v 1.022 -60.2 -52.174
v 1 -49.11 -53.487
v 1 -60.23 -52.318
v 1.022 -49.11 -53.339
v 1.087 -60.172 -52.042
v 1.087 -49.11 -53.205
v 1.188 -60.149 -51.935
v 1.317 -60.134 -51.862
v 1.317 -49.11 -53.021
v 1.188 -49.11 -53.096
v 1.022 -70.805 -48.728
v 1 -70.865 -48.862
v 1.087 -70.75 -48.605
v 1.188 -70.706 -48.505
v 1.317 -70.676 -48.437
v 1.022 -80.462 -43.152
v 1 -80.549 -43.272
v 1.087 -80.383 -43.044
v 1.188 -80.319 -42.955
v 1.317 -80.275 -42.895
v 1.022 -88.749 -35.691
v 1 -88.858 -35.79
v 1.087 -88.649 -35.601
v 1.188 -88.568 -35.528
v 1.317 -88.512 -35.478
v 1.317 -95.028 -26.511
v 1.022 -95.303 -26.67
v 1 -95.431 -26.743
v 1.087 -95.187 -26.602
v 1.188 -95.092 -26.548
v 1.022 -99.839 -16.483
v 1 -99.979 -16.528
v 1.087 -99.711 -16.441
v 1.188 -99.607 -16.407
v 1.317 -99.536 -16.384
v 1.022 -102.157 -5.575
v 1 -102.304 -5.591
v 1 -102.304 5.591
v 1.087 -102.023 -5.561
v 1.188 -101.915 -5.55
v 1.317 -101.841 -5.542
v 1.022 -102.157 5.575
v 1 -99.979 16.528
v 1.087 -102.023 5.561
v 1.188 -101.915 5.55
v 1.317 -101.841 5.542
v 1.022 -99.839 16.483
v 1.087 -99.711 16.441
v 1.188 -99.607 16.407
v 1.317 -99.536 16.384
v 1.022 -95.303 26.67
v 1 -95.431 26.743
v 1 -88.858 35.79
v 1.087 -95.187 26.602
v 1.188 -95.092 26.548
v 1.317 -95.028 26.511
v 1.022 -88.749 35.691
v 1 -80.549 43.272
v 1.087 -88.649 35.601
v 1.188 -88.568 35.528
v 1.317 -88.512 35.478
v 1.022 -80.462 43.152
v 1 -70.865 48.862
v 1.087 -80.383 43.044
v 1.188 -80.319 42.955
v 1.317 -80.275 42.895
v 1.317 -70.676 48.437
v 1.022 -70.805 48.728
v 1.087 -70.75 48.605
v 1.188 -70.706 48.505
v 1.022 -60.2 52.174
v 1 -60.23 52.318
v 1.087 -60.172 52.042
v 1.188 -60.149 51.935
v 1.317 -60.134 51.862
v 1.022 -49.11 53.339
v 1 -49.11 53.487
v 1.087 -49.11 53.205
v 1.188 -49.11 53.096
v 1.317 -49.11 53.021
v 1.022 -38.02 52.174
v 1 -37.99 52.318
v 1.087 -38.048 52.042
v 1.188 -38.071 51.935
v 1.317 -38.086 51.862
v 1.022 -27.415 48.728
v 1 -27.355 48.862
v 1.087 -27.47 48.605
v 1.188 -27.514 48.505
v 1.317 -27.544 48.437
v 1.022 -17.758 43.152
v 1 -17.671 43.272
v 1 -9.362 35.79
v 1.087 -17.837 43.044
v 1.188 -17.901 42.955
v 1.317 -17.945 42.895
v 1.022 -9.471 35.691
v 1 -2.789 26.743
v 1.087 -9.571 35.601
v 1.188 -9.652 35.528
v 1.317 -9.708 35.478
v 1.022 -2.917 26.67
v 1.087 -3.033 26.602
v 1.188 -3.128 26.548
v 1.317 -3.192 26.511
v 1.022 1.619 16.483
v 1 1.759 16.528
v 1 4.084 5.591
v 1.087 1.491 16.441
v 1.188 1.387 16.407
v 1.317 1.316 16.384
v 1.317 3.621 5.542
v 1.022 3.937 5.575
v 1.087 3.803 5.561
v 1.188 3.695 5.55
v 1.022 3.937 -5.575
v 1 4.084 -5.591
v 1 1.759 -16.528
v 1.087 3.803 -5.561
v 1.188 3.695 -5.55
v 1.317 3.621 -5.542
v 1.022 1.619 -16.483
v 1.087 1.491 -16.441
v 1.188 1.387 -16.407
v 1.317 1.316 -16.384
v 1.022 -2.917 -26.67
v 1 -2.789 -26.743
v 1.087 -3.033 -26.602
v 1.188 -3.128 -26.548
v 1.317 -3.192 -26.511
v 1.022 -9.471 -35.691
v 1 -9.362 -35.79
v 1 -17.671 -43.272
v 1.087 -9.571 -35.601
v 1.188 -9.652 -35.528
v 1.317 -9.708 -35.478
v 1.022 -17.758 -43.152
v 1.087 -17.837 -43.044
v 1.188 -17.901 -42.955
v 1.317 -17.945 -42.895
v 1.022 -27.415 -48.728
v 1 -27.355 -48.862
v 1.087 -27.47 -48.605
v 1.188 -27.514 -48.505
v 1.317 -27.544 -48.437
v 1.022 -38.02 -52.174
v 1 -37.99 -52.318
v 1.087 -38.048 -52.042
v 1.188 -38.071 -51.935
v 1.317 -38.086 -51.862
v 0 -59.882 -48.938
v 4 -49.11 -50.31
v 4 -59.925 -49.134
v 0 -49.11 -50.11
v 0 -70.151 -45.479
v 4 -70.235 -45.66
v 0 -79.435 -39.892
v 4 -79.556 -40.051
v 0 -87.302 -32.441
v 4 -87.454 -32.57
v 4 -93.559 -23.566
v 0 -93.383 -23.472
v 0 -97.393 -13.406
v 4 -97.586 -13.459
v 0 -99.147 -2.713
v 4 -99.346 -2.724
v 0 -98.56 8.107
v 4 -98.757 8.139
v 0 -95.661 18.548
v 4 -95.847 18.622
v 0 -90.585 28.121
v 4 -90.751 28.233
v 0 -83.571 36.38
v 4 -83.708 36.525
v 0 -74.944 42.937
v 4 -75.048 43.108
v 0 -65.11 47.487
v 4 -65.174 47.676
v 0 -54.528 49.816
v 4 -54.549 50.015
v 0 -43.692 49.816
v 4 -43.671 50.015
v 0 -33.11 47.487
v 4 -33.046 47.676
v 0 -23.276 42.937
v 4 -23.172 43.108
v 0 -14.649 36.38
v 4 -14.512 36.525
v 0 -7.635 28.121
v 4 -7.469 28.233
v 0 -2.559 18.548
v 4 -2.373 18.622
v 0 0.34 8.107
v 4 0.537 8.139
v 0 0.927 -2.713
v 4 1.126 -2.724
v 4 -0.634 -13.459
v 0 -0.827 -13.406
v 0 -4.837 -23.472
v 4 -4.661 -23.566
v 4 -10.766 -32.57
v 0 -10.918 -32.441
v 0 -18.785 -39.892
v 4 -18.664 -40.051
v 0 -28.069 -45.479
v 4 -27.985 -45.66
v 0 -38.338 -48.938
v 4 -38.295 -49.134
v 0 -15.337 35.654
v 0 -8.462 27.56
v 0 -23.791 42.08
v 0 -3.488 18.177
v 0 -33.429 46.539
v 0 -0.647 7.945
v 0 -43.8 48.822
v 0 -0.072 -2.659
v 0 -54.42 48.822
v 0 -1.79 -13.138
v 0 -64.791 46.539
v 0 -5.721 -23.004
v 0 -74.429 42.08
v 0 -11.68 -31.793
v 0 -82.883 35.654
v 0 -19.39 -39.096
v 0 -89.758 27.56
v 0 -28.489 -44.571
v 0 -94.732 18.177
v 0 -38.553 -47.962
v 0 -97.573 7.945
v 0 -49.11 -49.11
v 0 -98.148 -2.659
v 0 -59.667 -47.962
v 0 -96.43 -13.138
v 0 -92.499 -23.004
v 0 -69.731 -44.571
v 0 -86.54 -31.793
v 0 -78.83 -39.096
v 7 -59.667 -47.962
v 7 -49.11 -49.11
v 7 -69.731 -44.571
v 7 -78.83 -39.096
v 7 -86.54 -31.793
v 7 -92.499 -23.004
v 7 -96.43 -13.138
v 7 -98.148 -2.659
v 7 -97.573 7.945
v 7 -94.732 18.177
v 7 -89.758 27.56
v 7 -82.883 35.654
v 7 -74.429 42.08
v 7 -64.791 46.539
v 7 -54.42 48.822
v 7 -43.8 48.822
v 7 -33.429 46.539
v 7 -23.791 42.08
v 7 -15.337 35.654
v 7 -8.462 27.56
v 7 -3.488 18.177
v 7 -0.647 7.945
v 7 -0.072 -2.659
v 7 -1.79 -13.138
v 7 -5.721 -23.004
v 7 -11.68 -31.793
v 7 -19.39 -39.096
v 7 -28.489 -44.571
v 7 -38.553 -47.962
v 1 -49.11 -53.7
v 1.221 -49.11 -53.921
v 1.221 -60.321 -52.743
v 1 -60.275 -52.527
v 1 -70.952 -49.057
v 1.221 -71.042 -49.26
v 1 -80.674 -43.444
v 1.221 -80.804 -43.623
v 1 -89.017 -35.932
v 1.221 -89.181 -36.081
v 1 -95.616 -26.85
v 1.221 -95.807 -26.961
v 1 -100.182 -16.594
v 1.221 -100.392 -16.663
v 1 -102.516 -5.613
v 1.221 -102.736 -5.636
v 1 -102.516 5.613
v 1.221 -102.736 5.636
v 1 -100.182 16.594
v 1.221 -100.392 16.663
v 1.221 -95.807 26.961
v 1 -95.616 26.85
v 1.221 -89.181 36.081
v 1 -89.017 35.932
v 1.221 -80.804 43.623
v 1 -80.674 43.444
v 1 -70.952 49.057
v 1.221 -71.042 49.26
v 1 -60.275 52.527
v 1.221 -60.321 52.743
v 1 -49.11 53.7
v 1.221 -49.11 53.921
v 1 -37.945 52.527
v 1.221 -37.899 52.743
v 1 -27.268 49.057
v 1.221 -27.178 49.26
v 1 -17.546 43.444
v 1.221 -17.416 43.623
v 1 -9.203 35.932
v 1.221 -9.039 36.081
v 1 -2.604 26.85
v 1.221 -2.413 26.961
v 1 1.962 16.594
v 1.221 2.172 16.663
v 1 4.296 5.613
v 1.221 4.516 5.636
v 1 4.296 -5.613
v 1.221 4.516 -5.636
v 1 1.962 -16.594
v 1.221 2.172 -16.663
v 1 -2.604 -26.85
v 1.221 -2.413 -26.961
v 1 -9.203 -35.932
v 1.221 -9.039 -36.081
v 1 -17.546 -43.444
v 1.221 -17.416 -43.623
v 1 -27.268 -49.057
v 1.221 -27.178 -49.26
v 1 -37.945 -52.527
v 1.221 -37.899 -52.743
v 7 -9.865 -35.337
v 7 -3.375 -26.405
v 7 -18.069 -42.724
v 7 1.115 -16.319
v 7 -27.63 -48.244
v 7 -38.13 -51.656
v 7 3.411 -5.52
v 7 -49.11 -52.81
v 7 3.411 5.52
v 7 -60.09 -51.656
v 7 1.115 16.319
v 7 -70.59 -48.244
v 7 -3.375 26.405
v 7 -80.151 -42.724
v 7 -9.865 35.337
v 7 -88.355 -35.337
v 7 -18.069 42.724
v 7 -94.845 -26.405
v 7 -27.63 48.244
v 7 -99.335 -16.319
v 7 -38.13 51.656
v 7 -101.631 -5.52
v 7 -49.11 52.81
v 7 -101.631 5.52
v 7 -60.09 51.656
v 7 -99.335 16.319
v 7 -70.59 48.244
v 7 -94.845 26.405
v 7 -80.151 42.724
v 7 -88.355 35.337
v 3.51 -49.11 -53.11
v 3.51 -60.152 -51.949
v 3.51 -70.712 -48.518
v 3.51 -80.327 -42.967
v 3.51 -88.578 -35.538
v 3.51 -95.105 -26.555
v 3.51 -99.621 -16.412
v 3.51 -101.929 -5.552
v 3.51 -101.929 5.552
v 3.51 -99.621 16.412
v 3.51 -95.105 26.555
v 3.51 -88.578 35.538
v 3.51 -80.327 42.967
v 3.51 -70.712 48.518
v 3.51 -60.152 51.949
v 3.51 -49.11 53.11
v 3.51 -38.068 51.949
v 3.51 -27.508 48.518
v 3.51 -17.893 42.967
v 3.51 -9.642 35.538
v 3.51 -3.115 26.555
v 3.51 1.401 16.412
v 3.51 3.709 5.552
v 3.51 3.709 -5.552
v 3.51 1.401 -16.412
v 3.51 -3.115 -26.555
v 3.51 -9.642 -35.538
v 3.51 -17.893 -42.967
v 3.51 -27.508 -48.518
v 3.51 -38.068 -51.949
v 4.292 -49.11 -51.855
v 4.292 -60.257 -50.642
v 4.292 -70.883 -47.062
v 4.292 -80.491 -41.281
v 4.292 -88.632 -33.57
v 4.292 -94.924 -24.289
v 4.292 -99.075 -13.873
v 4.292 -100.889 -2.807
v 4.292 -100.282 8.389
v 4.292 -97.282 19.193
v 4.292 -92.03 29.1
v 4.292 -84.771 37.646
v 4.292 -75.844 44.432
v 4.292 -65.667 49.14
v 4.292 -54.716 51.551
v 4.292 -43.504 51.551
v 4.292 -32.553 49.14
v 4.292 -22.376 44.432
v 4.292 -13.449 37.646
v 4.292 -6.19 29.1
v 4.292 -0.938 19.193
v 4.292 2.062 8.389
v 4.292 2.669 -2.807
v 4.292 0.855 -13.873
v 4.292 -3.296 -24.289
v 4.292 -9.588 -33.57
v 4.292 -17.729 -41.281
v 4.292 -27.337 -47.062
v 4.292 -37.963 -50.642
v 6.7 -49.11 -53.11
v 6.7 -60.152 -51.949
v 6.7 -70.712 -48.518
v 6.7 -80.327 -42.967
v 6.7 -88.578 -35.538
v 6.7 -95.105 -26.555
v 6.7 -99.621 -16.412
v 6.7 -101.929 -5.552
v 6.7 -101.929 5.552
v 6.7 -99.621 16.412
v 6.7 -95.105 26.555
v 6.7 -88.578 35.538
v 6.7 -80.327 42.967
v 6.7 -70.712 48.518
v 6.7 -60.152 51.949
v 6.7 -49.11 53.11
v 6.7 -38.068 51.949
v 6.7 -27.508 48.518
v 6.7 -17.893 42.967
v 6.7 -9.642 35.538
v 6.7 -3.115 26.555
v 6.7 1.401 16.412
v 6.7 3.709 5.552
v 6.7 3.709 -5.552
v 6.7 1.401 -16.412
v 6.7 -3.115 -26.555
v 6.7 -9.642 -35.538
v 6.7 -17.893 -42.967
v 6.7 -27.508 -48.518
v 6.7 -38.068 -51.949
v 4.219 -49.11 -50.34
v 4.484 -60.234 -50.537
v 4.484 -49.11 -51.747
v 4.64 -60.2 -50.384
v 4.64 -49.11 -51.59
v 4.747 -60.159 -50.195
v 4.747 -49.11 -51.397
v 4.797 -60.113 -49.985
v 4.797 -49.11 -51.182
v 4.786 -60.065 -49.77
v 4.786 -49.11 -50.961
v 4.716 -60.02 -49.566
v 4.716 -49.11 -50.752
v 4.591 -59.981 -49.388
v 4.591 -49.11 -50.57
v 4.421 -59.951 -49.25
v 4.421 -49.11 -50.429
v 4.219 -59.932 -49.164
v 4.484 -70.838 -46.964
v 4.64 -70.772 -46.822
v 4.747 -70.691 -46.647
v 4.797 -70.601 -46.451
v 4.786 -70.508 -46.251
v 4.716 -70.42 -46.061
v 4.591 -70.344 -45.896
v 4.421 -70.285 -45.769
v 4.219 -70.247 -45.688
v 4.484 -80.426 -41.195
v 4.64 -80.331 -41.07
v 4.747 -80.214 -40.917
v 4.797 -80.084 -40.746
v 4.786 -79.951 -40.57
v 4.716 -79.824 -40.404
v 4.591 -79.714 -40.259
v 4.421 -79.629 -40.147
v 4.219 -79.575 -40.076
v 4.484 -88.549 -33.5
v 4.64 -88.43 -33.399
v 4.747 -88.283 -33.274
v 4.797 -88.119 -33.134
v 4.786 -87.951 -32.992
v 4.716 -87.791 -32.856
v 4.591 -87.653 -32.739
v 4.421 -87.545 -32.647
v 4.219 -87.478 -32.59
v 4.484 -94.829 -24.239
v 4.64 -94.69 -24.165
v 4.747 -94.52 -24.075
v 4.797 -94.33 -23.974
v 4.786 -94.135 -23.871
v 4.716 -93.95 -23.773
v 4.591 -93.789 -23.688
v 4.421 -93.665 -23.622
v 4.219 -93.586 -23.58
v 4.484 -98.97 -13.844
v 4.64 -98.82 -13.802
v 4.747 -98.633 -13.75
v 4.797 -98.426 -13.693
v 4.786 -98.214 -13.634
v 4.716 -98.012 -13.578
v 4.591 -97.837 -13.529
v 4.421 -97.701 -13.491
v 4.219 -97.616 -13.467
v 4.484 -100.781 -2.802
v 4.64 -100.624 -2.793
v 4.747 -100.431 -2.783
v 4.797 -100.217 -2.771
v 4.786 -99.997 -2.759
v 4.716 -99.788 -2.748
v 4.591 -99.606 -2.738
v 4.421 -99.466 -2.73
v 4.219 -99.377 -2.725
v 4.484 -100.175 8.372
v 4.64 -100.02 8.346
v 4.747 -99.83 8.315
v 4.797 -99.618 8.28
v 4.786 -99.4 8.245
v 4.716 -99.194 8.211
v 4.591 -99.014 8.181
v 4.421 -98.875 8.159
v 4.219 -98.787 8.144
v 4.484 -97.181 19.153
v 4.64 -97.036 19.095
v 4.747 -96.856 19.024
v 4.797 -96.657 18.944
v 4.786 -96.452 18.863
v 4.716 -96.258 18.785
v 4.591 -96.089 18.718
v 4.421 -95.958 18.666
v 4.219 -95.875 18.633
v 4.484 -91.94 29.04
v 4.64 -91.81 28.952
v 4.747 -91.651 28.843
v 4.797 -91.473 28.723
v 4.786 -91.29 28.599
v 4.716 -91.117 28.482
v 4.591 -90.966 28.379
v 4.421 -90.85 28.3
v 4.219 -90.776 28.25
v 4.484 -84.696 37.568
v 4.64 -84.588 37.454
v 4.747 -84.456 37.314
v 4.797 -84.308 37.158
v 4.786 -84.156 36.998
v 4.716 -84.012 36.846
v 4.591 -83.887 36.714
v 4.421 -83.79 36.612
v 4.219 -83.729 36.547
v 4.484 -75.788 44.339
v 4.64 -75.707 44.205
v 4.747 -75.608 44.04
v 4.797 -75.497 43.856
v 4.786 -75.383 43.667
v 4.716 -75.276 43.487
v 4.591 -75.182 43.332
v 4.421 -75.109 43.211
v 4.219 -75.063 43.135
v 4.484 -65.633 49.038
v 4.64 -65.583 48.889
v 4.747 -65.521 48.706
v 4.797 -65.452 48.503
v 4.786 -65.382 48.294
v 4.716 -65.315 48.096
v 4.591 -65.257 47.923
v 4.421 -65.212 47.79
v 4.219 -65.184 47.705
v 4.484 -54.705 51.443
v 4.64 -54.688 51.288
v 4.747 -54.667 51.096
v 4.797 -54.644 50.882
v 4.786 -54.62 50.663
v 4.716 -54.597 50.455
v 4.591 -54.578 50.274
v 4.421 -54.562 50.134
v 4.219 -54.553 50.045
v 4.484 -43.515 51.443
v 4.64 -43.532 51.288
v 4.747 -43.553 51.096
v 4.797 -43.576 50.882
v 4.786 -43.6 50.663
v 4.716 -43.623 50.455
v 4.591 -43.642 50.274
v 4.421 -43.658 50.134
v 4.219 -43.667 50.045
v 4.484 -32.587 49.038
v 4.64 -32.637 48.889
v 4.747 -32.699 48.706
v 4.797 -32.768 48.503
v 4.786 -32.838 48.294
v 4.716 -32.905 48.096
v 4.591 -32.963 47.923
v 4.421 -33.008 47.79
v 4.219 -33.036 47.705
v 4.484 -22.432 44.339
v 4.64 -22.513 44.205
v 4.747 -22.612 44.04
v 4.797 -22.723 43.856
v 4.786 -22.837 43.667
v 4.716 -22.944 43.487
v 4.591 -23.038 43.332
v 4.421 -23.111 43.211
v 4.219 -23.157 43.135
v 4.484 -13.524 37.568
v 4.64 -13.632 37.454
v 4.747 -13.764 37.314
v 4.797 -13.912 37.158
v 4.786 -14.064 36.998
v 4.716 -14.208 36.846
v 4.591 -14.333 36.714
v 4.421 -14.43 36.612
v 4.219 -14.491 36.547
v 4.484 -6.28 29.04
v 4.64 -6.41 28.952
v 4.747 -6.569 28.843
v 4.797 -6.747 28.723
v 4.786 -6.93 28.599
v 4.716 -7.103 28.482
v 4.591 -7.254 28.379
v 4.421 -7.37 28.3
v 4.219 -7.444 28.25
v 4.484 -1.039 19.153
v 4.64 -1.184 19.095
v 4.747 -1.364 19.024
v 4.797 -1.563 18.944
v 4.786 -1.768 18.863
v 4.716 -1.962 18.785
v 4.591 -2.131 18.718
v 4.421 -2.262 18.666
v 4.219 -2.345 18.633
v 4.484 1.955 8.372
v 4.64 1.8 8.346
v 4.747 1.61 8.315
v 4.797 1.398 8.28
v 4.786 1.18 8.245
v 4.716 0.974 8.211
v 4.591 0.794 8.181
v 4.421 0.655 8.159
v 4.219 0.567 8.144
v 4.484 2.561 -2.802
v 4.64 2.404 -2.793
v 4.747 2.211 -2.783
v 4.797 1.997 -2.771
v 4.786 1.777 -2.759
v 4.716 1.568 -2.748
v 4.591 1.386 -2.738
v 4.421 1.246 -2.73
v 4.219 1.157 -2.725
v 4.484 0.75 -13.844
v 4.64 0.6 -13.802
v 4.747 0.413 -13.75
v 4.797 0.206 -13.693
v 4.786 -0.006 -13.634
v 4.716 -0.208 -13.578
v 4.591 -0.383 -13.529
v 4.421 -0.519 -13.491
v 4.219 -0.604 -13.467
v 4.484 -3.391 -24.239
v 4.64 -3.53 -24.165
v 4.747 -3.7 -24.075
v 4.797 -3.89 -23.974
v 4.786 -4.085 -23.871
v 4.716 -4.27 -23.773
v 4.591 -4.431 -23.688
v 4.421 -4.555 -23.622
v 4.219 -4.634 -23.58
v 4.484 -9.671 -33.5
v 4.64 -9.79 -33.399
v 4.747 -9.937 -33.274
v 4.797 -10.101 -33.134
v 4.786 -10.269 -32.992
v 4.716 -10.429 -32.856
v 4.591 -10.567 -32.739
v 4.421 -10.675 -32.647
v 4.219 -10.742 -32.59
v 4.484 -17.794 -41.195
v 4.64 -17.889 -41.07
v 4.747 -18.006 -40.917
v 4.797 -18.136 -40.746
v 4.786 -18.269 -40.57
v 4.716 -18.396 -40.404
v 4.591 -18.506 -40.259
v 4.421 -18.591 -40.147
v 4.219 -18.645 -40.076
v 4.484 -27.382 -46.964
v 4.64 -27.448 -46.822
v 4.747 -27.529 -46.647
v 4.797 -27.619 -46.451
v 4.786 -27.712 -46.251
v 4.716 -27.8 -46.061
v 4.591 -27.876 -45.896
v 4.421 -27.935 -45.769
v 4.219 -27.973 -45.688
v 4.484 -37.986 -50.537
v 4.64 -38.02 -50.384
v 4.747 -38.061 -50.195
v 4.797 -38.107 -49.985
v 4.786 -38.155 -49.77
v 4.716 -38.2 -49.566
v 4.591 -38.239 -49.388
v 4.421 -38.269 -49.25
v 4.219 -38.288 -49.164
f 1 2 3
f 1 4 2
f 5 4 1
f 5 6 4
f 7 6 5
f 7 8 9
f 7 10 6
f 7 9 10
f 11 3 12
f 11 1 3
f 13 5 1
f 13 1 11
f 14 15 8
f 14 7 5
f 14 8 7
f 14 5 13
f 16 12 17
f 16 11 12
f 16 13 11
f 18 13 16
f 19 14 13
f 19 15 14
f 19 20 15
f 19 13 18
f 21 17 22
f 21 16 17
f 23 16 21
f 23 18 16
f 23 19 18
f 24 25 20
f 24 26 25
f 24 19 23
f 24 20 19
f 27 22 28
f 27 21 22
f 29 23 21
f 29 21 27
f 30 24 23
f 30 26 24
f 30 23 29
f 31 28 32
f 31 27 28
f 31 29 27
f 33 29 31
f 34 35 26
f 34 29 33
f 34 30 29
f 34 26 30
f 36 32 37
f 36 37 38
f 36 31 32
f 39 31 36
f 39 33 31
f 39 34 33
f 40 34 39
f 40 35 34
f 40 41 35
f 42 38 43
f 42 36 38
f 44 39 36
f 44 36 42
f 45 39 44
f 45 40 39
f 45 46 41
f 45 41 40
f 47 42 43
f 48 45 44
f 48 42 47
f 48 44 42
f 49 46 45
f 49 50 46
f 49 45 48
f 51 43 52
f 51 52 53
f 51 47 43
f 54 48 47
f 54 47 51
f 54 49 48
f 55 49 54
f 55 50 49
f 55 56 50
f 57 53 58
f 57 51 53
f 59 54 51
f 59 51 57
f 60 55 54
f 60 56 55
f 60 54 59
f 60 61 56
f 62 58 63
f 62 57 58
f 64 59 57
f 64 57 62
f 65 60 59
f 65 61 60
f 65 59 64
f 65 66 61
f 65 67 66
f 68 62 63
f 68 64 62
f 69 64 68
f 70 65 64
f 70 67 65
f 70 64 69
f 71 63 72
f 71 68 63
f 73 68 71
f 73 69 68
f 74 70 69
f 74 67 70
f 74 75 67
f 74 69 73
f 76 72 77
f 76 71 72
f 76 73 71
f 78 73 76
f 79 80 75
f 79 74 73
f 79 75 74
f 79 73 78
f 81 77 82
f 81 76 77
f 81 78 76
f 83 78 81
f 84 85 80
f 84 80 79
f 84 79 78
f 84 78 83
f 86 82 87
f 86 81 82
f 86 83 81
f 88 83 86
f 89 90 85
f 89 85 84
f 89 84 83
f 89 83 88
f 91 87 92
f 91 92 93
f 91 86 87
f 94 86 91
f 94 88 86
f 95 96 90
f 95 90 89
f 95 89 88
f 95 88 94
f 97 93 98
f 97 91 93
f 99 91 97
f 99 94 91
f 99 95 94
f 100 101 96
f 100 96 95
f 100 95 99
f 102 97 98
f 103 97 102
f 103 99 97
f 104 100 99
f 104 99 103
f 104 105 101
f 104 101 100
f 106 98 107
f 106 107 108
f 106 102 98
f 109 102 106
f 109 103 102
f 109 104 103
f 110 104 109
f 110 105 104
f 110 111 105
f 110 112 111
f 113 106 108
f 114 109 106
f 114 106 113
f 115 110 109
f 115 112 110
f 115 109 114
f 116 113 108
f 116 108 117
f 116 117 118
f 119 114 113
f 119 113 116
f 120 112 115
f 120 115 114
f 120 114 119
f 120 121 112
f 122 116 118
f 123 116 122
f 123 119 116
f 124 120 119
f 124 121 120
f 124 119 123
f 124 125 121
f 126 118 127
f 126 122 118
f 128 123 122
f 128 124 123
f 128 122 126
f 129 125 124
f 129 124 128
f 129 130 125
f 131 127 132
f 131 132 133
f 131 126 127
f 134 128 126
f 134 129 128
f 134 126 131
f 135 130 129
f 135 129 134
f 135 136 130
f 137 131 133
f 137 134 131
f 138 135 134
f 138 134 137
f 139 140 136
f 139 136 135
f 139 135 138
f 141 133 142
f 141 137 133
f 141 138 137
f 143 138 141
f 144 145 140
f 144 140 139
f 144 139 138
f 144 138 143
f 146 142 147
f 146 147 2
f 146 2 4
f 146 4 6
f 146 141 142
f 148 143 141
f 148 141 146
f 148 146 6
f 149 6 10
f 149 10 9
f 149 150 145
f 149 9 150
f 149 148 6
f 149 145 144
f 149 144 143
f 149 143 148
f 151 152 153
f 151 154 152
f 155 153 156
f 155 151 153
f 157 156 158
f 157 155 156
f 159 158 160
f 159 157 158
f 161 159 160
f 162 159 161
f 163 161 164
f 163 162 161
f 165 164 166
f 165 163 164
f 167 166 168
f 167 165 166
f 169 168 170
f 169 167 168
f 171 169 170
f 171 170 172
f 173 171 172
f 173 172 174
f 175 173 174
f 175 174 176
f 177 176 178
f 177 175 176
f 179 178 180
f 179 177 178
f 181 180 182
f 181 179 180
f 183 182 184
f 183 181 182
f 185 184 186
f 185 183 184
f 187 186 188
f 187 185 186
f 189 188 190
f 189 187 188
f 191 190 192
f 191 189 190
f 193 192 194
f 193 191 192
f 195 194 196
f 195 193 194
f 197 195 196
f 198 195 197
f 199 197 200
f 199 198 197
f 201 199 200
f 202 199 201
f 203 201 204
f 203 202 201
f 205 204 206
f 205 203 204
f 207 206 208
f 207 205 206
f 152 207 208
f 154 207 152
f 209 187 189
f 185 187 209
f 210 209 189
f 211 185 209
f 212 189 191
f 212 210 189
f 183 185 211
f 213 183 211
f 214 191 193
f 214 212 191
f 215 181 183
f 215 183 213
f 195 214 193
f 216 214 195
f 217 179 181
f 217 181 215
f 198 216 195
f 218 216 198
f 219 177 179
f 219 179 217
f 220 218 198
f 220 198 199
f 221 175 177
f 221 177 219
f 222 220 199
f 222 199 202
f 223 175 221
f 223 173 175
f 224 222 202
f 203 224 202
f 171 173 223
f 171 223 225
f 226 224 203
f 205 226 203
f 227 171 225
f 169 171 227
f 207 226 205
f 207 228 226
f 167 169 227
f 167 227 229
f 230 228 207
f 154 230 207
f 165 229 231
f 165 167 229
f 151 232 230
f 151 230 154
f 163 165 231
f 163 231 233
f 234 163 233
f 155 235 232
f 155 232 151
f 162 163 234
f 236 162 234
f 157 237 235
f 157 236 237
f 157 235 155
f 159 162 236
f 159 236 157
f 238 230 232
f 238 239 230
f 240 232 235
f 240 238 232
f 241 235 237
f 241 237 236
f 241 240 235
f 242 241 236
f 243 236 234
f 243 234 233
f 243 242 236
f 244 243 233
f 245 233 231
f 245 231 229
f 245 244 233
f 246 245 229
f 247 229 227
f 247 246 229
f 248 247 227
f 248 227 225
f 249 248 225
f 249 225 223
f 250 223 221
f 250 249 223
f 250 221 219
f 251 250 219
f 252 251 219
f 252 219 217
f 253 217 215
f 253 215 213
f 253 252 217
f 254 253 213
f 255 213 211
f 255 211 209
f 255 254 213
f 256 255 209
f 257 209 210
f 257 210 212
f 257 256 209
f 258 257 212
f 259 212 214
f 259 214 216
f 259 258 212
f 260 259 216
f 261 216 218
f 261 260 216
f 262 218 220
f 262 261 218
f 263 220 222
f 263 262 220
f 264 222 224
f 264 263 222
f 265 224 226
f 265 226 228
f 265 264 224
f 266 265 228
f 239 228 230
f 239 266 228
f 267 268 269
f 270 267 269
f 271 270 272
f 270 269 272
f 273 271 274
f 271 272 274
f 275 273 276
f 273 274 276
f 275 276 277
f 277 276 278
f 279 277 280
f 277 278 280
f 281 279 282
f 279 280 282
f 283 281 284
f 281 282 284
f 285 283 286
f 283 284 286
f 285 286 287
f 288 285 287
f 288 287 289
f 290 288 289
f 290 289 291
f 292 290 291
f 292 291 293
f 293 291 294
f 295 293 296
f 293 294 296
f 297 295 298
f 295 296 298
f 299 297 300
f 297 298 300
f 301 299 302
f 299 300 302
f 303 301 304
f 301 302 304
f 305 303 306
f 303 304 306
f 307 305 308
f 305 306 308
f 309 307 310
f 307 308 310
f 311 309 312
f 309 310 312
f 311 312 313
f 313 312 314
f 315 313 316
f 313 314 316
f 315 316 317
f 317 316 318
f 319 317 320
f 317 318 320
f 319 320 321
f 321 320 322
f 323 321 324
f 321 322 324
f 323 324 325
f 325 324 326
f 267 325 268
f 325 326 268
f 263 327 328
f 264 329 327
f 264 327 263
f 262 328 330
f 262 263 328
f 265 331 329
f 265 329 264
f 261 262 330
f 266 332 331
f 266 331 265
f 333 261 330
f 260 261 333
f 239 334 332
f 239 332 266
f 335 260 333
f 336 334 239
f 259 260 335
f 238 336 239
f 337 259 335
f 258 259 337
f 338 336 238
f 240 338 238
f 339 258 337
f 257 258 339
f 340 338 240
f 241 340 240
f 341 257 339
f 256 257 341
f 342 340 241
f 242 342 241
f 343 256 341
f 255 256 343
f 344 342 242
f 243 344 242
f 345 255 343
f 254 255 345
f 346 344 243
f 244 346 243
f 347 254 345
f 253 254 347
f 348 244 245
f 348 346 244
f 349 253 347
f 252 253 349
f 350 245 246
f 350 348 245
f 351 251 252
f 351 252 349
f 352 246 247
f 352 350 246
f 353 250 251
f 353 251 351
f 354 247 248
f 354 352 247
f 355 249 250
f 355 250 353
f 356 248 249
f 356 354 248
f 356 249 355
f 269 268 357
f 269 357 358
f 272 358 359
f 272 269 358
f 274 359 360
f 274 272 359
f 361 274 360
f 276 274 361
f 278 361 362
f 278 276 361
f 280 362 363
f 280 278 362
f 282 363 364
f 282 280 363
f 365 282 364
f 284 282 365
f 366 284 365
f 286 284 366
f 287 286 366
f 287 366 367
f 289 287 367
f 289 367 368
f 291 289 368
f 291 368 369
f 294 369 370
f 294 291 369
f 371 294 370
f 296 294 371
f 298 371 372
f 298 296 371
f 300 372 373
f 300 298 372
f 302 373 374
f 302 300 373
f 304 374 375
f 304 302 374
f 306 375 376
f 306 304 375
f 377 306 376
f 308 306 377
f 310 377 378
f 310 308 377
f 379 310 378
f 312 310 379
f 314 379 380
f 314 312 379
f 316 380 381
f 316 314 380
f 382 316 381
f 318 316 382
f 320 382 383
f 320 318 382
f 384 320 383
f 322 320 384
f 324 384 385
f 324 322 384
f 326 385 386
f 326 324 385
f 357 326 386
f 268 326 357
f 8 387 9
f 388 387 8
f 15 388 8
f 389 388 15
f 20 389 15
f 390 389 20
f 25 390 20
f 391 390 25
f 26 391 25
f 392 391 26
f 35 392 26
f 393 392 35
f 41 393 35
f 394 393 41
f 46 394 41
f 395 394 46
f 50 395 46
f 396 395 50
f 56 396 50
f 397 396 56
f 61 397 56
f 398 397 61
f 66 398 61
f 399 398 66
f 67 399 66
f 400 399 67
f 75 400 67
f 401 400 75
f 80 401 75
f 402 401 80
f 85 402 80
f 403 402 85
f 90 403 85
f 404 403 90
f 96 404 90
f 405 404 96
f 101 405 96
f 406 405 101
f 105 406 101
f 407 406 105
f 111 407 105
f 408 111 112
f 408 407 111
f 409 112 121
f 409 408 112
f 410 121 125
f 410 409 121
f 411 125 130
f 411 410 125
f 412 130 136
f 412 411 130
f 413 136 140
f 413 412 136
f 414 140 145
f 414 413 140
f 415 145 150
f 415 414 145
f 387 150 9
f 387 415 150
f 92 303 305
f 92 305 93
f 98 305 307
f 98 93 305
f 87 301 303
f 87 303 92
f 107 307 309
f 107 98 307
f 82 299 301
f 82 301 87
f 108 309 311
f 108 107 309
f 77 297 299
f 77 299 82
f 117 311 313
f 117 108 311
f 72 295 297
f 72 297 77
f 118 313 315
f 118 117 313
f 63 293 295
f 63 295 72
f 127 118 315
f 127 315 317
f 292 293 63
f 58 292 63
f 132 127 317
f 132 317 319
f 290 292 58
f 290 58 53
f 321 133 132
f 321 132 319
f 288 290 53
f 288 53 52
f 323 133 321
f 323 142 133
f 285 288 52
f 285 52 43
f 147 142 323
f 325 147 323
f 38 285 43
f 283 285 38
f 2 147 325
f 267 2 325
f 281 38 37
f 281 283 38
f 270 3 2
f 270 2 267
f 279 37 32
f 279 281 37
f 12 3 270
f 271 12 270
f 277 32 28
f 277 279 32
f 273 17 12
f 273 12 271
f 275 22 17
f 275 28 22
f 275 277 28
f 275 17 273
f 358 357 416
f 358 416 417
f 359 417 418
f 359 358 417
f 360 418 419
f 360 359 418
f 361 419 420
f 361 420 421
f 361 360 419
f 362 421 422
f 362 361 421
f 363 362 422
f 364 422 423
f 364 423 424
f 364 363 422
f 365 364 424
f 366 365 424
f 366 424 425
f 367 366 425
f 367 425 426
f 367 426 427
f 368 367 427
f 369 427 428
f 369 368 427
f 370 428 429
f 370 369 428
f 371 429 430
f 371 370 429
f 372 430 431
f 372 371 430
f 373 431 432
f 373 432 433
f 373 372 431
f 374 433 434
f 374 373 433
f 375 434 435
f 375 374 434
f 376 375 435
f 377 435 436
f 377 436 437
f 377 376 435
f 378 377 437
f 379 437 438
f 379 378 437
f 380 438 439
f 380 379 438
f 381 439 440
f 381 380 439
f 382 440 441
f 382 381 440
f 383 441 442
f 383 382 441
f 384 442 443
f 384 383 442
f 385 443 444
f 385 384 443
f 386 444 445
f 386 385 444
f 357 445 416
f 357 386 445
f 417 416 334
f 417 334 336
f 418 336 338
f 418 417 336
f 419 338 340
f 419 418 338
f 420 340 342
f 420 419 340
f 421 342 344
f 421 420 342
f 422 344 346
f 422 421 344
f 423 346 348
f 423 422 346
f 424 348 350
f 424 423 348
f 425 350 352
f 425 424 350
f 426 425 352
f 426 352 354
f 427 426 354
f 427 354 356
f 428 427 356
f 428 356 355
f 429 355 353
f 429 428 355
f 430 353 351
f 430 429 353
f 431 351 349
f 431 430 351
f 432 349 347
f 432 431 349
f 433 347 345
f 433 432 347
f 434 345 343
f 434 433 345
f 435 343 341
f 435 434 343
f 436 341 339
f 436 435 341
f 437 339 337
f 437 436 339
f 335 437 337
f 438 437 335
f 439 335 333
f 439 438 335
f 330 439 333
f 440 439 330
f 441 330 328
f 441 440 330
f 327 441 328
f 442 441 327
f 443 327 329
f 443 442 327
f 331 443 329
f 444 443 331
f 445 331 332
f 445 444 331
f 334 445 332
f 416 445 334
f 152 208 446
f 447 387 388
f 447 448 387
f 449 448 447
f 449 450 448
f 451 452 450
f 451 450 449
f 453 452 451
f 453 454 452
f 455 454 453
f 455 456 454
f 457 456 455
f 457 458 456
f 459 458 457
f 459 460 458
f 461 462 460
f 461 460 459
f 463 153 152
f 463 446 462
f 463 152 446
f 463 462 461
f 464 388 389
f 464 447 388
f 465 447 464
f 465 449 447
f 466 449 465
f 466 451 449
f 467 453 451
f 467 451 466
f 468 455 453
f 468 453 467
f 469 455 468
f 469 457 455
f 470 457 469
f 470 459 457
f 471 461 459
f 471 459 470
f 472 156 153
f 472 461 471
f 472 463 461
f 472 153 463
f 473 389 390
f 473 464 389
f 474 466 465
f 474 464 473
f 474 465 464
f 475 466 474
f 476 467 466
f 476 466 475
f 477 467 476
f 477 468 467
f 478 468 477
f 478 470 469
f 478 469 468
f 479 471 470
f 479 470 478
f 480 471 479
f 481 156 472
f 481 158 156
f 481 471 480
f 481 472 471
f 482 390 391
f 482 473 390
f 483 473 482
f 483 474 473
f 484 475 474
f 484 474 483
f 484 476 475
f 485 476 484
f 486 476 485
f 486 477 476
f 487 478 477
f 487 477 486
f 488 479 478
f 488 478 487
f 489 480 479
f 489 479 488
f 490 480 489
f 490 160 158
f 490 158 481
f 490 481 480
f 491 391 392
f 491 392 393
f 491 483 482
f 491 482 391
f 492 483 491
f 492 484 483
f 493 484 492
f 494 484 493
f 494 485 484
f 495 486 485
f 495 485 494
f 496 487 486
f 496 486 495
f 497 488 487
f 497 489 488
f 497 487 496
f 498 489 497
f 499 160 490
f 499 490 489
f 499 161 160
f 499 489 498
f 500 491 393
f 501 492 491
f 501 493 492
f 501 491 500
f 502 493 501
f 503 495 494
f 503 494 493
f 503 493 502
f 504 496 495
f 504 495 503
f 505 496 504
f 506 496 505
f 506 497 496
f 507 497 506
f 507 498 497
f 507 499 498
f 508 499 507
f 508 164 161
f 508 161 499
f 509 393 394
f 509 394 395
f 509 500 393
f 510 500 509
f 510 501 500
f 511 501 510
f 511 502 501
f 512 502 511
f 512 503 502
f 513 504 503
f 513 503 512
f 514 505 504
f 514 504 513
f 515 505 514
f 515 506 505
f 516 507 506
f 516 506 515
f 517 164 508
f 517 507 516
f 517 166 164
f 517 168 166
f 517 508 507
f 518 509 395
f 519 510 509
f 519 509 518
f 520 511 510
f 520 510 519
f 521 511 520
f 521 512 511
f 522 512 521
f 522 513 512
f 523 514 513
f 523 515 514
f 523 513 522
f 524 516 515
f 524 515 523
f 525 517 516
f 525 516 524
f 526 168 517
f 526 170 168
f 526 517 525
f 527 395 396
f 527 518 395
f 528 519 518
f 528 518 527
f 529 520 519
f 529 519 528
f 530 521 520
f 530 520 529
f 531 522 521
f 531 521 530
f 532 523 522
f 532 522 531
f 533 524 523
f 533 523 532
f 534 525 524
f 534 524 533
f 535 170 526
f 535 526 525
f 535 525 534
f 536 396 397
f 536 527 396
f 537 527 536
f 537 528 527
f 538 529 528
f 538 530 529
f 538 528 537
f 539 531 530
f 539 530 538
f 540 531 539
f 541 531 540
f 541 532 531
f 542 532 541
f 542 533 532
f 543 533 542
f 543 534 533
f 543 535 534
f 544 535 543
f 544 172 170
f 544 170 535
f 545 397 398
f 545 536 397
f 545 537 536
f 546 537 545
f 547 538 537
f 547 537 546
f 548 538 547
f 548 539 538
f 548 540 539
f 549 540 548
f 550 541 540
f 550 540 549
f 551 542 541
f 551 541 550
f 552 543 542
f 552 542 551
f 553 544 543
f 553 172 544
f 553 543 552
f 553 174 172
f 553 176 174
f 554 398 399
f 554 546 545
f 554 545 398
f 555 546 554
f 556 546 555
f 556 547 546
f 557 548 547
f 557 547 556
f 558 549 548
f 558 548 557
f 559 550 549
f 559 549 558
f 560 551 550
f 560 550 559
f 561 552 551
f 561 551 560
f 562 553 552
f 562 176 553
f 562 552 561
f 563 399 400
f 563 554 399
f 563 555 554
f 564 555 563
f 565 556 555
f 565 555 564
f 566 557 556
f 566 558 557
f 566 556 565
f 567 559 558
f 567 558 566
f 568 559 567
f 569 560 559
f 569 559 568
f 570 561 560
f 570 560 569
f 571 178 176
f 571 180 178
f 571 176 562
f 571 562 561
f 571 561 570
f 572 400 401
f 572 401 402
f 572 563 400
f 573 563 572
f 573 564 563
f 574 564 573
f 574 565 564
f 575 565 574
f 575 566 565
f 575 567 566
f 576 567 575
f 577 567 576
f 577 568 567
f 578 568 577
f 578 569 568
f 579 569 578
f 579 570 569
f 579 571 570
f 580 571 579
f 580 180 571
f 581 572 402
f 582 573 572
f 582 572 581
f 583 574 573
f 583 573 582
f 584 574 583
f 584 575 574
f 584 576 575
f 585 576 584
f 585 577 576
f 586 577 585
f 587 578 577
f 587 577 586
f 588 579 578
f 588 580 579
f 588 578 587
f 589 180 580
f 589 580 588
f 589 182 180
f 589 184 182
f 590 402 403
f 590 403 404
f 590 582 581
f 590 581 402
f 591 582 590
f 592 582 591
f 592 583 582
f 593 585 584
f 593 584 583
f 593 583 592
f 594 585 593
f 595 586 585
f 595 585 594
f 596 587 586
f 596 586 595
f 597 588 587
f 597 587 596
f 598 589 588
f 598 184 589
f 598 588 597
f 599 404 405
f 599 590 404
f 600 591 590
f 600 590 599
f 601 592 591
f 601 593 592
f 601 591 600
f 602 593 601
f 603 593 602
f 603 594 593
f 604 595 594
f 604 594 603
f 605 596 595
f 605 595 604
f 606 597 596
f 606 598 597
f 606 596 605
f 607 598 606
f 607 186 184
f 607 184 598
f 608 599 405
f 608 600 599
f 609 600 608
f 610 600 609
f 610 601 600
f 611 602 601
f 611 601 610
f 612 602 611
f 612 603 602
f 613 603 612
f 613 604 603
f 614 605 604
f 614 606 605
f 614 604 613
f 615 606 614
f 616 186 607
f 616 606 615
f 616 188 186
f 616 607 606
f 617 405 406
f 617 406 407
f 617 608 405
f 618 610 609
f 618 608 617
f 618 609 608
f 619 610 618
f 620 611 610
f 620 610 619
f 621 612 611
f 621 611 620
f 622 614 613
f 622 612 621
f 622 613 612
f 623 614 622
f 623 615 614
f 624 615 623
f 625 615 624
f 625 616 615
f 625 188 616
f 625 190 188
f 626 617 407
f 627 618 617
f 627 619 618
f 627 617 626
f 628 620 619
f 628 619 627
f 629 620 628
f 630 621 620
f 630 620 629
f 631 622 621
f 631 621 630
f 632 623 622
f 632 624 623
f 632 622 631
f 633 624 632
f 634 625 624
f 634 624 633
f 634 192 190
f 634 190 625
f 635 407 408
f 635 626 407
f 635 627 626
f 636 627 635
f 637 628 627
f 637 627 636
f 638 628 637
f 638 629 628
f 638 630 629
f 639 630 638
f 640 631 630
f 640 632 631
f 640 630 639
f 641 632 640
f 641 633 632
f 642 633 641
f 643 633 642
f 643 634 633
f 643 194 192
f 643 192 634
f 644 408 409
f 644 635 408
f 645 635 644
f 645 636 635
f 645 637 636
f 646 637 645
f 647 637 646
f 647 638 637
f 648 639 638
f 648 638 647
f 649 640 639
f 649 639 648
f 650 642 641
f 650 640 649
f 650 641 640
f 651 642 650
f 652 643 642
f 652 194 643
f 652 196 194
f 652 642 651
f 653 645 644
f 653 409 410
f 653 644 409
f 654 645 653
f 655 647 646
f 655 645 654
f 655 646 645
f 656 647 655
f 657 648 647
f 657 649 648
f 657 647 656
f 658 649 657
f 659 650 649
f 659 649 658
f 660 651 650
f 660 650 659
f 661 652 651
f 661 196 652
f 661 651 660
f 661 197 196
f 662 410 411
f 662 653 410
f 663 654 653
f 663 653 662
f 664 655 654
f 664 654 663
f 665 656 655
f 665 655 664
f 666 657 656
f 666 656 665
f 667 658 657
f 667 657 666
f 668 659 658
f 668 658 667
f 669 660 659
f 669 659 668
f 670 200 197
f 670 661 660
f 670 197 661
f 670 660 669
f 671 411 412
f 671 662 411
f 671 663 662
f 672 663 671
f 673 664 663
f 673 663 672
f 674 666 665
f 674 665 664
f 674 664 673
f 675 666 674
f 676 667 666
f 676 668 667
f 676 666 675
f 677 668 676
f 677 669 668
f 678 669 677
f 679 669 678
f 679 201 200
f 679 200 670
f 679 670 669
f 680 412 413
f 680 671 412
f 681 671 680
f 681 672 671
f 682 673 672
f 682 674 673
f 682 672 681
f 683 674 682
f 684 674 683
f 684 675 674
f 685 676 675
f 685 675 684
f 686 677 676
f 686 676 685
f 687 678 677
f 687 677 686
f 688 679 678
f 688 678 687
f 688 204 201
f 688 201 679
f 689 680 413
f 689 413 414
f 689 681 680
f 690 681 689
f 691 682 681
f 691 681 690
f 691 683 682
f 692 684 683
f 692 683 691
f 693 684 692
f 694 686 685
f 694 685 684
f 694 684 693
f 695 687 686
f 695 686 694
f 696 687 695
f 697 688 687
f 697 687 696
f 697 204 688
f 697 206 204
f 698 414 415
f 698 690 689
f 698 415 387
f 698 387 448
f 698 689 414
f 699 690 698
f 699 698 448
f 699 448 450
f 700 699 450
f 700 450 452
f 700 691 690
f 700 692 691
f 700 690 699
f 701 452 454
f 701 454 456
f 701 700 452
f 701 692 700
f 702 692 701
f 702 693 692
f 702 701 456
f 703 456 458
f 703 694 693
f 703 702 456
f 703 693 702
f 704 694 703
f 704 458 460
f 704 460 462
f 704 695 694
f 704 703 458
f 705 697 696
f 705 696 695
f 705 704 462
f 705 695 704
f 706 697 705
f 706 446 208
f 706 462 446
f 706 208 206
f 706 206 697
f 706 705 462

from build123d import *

# Parameters (mm, degrees)
CHAMFER1_SIZE  = 0.3
CHAMFER2_SIZE  = 0.3
CHAMFER2_SIZE2 = 0.234981042


with BuildPart() as part:
    # Sketch1 → Revolve2 (revolve)
    with BuildSketch(Plane.XY, mode=Mode.PRIVATE) as revolve2_sk:
        with BuildLine():
            Line((0, 0), (7, 0))
            Line((7, 0), (7, 4))
            Line((7, 4), (3.51, 4))
            Line((3.51, 4), (1, 4.89))
            Line((1, 4.89), (1, 4.3766025))
            ThreePointArc((1, 4.3766025), (1.086926266, 4.094875522), (1.317480361, 3.911106441))
            Line((1.317480361, 3.911106441), (4.292031423, 2.744793695))
            ThreePointArc((4.292031423, 2.744793695), (4.786077272, 1.851398109), (4, 1.2))
            Line((4, 1.2), (0, 1))
            Line((0, 1), (0, 0))
        make_face()
    revolve(revolve2_sk.sketch.rotate(Axis((7, -49.11, 0), (-1, 0, 0)), 90), axis=Axis((7, -49.11, 0), (-1, 0, 0)))

    # Chamfer1
    chamfer1_edges = [part.edges().sort_by_distance(p)[0] for p in [
        (7, -49.11, 53.11),
    ]]
    chamfer(chamfer1_edges, length=CHAMFER1_SIZE)

    # Chamfer2
    chamfer2_edges = [part.edges().sort_by_distance(p)[0] for p in [
        (1, -49.11, 54),
    ]]
    chamfer2_side = [part.faces().sort_by_distance(p)[0] for p in [
        (1, -49.11, 53.847264935),
    ]]
    chamfer(chamfer2_edges, length=CHAMFER2_SIZE, length2=CHAMFER2_SIZE2, reference=chamfer2_side[0])


solid = part.part
